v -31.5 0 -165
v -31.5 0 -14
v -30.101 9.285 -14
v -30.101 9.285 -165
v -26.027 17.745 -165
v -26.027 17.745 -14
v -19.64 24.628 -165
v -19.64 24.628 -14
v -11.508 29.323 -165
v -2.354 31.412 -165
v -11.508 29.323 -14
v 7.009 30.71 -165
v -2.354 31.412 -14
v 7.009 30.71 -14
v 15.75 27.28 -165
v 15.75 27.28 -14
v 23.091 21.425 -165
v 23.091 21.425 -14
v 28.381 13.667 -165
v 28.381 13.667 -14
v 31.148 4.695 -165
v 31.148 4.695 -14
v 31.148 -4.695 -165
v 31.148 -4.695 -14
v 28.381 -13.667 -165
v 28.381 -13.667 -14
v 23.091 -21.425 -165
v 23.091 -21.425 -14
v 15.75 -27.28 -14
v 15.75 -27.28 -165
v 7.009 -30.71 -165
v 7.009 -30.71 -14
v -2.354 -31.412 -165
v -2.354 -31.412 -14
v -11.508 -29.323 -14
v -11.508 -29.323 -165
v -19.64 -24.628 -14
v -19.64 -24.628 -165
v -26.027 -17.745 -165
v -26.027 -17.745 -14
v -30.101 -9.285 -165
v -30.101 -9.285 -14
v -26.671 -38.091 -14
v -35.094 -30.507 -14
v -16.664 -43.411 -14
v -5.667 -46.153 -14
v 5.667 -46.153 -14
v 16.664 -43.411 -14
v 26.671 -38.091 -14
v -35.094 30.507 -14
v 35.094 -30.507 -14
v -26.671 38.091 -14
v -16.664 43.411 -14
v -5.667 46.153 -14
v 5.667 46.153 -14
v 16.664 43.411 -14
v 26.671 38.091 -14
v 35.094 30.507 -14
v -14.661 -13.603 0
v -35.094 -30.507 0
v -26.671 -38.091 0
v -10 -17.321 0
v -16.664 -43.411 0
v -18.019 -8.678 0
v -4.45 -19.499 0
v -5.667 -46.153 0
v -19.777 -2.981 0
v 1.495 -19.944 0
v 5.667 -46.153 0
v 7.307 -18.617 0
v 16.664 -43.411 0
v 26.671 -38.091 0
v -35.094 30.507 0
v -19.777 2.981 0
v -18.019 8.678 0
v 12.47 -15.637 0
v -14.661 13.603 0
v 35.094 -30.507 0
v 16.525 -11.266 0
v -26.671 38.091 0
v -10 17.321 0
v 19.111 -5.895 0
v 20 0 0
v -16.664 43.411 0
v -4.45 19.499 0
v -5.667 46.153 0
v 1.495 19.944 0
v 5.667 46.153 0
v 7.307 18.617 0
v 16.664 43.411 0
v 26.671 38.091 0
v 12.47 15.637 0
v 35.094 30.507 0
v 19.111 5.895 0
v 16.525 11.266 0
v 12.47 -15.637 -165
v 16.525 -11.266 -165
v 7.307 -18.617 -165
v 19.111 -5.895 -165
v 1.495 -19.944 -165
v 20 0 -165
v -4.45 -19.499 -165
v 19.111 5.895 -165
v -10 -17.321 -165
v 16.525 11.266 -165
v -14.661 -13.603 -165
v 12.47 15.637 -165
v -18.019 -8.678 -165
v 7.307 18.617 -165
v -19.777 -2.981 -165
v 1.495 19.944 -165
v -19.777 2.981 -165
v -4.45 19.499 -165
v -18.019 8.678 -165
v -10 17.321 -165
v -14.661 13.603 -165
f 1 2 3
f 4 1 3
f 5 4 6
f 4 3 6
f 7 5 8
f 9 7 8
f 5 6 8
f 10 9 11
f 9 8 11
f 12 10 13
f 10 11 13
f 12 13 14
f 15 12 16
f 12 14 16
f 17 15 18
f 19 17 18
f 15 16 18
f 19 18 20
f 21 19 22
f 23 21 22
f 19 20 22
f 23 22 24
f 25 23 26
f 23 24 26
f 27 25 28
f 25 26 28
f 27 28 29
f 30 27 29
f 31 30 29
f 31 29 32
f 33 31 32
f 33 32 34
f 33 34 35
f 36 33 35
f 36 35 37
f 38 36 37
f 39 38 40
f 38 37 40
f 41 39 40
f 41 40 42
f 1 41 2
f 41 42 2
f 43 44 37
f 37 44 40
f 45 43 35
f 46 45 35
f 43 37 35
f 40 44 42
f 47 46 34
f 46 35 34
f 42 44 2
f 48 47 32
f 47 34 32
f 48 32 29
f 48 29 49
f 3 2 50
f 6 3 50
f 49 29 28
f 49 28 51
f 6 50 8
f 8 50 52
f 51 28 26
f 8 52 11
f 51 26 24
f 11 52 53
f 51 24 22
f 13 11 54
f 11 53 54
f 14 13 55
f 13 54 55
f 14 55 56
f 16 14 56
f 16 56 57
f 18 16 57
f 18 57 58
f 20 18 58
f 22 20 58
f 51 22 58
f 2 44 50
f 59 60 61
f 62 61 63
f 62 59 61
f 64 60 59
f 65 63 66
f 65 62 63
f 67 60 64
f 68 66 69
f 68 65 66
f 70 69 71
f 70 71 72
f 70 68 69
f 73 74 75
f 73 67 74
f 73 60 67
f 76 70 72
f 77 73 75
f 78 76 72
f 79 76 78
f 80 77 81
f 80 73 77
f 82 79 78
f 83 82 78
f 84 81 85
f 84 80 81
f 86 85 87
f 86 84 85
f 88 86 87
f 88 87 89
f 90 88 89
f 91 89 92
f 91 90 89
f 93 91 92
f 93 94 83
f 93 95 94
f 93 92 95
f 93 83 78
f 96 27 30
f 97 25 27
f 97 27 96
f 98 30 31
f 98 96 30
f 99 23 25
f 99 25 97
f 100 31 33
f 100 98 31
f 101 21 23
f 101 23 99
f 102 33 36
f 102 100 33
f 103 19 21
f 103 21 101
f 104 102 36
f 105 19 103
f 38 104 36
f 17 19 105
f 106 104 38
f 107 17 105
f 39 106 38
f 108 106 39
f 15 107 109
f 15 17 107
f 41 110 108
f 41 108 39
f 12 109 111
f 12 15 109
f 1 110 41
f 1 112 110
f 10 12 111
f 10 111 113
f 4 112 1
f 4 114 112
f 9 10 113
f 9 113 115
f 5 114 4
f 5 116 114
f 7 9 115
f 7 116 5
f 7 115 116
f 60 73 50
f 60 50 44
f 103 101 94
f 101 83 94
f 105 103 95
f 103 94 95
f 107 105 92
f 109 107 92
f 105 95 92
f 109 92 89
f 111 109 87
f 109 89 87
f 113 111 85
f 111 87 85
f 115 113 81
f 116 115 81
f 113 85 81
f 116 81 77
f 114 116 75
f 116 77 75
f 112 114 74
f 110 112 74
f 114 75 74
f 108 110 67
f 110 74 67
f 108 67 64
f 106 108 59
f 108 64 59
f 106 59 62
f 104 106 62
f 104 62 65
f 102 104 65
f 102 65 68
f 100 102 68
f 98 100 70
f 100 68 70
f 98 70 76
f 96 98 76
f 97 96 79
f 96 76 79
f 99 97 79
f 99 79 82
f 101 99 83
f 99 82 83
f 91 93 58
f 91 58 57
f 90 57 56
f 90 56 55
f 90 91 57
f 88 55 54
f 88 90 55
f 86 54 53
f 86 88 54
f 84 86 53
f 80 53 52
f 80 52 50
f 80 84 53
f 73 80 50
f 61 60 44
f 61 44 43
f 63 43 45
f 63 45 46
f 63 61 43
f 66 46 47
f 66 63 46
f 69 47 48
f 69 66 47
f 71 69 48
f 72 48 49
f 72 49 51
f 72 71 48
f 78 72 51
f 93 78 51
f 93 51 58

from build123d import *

# Parameters (mm, degrees)
EXTRUDE_1_DEPTH     = 14
SKETCH_2_R          = 31.5
EXTRUDE_2_DEPTH     = 151
CUT_EXTRUDE_1_DEPTH = 175.982394882


with BuildPart() as part:
    # 草图1 → 凸台-拉伸1 (new body)
    with BuildSketch(Plane.XY):
        with BuildLine():
            ThreePointArc((35.09399548, 30.506744848), (0, 46.5), (-35.09399548, 30.506744848))
            Line((-35.09399548, 30.506744848), (-35.09399548, -30.506744848))
            ThreePointArc((-35.09399548, -30.506744848), (0, -46.5), (35.09399548, -30.506744848))
            Line((35.09399548, -30.506744848), (35.09399548, 9.403407748))
            Line((35.09399548, 9.403407748), (35.09399548, 30.506744848))
        make_face()
        with BuildLine():
            ThreePointArc((20, 0), (-19.828897227, -2.610523844), (19.318516526, 5.176380902))
            ThreePointArc((19.318516526, 5.176380902), (19.828897227, 2.610523844), (20, 0))
        make_face(mode=Mode.SUBTRACT)
    extrude(amount=-EXTRUDE_1_DEPTH)

    # 草图2 → 凸台-拉伸2 (add)
    with BuildSketch(Plane(origin=(0, 0, -14), x_dir=(-1, 0, 0), z_dir=(0, 0, -1))):
        Circle(SKETCH_2_R)
    extrude(amount=EXTRUDE_2_DEPTH)

    # 草图1<3> → 切除-拉伸1 (cut, through all)
    with BuildSketch(Plane.XY):
        with BuildLine():
            ThreePointArc((20, 0), (19.828897227, 2.610523844), (19.318516526, 5.176380902))
            ThreePointArc((19.318516526, 5.176380902), (-19.828897227, -2.610523844), (20, 0))
        make_face()
    extrude(amount=-CUT_EXTRUDE_1_DEPTH, mode=Mode.SUBTRACT)


solid = part.part
